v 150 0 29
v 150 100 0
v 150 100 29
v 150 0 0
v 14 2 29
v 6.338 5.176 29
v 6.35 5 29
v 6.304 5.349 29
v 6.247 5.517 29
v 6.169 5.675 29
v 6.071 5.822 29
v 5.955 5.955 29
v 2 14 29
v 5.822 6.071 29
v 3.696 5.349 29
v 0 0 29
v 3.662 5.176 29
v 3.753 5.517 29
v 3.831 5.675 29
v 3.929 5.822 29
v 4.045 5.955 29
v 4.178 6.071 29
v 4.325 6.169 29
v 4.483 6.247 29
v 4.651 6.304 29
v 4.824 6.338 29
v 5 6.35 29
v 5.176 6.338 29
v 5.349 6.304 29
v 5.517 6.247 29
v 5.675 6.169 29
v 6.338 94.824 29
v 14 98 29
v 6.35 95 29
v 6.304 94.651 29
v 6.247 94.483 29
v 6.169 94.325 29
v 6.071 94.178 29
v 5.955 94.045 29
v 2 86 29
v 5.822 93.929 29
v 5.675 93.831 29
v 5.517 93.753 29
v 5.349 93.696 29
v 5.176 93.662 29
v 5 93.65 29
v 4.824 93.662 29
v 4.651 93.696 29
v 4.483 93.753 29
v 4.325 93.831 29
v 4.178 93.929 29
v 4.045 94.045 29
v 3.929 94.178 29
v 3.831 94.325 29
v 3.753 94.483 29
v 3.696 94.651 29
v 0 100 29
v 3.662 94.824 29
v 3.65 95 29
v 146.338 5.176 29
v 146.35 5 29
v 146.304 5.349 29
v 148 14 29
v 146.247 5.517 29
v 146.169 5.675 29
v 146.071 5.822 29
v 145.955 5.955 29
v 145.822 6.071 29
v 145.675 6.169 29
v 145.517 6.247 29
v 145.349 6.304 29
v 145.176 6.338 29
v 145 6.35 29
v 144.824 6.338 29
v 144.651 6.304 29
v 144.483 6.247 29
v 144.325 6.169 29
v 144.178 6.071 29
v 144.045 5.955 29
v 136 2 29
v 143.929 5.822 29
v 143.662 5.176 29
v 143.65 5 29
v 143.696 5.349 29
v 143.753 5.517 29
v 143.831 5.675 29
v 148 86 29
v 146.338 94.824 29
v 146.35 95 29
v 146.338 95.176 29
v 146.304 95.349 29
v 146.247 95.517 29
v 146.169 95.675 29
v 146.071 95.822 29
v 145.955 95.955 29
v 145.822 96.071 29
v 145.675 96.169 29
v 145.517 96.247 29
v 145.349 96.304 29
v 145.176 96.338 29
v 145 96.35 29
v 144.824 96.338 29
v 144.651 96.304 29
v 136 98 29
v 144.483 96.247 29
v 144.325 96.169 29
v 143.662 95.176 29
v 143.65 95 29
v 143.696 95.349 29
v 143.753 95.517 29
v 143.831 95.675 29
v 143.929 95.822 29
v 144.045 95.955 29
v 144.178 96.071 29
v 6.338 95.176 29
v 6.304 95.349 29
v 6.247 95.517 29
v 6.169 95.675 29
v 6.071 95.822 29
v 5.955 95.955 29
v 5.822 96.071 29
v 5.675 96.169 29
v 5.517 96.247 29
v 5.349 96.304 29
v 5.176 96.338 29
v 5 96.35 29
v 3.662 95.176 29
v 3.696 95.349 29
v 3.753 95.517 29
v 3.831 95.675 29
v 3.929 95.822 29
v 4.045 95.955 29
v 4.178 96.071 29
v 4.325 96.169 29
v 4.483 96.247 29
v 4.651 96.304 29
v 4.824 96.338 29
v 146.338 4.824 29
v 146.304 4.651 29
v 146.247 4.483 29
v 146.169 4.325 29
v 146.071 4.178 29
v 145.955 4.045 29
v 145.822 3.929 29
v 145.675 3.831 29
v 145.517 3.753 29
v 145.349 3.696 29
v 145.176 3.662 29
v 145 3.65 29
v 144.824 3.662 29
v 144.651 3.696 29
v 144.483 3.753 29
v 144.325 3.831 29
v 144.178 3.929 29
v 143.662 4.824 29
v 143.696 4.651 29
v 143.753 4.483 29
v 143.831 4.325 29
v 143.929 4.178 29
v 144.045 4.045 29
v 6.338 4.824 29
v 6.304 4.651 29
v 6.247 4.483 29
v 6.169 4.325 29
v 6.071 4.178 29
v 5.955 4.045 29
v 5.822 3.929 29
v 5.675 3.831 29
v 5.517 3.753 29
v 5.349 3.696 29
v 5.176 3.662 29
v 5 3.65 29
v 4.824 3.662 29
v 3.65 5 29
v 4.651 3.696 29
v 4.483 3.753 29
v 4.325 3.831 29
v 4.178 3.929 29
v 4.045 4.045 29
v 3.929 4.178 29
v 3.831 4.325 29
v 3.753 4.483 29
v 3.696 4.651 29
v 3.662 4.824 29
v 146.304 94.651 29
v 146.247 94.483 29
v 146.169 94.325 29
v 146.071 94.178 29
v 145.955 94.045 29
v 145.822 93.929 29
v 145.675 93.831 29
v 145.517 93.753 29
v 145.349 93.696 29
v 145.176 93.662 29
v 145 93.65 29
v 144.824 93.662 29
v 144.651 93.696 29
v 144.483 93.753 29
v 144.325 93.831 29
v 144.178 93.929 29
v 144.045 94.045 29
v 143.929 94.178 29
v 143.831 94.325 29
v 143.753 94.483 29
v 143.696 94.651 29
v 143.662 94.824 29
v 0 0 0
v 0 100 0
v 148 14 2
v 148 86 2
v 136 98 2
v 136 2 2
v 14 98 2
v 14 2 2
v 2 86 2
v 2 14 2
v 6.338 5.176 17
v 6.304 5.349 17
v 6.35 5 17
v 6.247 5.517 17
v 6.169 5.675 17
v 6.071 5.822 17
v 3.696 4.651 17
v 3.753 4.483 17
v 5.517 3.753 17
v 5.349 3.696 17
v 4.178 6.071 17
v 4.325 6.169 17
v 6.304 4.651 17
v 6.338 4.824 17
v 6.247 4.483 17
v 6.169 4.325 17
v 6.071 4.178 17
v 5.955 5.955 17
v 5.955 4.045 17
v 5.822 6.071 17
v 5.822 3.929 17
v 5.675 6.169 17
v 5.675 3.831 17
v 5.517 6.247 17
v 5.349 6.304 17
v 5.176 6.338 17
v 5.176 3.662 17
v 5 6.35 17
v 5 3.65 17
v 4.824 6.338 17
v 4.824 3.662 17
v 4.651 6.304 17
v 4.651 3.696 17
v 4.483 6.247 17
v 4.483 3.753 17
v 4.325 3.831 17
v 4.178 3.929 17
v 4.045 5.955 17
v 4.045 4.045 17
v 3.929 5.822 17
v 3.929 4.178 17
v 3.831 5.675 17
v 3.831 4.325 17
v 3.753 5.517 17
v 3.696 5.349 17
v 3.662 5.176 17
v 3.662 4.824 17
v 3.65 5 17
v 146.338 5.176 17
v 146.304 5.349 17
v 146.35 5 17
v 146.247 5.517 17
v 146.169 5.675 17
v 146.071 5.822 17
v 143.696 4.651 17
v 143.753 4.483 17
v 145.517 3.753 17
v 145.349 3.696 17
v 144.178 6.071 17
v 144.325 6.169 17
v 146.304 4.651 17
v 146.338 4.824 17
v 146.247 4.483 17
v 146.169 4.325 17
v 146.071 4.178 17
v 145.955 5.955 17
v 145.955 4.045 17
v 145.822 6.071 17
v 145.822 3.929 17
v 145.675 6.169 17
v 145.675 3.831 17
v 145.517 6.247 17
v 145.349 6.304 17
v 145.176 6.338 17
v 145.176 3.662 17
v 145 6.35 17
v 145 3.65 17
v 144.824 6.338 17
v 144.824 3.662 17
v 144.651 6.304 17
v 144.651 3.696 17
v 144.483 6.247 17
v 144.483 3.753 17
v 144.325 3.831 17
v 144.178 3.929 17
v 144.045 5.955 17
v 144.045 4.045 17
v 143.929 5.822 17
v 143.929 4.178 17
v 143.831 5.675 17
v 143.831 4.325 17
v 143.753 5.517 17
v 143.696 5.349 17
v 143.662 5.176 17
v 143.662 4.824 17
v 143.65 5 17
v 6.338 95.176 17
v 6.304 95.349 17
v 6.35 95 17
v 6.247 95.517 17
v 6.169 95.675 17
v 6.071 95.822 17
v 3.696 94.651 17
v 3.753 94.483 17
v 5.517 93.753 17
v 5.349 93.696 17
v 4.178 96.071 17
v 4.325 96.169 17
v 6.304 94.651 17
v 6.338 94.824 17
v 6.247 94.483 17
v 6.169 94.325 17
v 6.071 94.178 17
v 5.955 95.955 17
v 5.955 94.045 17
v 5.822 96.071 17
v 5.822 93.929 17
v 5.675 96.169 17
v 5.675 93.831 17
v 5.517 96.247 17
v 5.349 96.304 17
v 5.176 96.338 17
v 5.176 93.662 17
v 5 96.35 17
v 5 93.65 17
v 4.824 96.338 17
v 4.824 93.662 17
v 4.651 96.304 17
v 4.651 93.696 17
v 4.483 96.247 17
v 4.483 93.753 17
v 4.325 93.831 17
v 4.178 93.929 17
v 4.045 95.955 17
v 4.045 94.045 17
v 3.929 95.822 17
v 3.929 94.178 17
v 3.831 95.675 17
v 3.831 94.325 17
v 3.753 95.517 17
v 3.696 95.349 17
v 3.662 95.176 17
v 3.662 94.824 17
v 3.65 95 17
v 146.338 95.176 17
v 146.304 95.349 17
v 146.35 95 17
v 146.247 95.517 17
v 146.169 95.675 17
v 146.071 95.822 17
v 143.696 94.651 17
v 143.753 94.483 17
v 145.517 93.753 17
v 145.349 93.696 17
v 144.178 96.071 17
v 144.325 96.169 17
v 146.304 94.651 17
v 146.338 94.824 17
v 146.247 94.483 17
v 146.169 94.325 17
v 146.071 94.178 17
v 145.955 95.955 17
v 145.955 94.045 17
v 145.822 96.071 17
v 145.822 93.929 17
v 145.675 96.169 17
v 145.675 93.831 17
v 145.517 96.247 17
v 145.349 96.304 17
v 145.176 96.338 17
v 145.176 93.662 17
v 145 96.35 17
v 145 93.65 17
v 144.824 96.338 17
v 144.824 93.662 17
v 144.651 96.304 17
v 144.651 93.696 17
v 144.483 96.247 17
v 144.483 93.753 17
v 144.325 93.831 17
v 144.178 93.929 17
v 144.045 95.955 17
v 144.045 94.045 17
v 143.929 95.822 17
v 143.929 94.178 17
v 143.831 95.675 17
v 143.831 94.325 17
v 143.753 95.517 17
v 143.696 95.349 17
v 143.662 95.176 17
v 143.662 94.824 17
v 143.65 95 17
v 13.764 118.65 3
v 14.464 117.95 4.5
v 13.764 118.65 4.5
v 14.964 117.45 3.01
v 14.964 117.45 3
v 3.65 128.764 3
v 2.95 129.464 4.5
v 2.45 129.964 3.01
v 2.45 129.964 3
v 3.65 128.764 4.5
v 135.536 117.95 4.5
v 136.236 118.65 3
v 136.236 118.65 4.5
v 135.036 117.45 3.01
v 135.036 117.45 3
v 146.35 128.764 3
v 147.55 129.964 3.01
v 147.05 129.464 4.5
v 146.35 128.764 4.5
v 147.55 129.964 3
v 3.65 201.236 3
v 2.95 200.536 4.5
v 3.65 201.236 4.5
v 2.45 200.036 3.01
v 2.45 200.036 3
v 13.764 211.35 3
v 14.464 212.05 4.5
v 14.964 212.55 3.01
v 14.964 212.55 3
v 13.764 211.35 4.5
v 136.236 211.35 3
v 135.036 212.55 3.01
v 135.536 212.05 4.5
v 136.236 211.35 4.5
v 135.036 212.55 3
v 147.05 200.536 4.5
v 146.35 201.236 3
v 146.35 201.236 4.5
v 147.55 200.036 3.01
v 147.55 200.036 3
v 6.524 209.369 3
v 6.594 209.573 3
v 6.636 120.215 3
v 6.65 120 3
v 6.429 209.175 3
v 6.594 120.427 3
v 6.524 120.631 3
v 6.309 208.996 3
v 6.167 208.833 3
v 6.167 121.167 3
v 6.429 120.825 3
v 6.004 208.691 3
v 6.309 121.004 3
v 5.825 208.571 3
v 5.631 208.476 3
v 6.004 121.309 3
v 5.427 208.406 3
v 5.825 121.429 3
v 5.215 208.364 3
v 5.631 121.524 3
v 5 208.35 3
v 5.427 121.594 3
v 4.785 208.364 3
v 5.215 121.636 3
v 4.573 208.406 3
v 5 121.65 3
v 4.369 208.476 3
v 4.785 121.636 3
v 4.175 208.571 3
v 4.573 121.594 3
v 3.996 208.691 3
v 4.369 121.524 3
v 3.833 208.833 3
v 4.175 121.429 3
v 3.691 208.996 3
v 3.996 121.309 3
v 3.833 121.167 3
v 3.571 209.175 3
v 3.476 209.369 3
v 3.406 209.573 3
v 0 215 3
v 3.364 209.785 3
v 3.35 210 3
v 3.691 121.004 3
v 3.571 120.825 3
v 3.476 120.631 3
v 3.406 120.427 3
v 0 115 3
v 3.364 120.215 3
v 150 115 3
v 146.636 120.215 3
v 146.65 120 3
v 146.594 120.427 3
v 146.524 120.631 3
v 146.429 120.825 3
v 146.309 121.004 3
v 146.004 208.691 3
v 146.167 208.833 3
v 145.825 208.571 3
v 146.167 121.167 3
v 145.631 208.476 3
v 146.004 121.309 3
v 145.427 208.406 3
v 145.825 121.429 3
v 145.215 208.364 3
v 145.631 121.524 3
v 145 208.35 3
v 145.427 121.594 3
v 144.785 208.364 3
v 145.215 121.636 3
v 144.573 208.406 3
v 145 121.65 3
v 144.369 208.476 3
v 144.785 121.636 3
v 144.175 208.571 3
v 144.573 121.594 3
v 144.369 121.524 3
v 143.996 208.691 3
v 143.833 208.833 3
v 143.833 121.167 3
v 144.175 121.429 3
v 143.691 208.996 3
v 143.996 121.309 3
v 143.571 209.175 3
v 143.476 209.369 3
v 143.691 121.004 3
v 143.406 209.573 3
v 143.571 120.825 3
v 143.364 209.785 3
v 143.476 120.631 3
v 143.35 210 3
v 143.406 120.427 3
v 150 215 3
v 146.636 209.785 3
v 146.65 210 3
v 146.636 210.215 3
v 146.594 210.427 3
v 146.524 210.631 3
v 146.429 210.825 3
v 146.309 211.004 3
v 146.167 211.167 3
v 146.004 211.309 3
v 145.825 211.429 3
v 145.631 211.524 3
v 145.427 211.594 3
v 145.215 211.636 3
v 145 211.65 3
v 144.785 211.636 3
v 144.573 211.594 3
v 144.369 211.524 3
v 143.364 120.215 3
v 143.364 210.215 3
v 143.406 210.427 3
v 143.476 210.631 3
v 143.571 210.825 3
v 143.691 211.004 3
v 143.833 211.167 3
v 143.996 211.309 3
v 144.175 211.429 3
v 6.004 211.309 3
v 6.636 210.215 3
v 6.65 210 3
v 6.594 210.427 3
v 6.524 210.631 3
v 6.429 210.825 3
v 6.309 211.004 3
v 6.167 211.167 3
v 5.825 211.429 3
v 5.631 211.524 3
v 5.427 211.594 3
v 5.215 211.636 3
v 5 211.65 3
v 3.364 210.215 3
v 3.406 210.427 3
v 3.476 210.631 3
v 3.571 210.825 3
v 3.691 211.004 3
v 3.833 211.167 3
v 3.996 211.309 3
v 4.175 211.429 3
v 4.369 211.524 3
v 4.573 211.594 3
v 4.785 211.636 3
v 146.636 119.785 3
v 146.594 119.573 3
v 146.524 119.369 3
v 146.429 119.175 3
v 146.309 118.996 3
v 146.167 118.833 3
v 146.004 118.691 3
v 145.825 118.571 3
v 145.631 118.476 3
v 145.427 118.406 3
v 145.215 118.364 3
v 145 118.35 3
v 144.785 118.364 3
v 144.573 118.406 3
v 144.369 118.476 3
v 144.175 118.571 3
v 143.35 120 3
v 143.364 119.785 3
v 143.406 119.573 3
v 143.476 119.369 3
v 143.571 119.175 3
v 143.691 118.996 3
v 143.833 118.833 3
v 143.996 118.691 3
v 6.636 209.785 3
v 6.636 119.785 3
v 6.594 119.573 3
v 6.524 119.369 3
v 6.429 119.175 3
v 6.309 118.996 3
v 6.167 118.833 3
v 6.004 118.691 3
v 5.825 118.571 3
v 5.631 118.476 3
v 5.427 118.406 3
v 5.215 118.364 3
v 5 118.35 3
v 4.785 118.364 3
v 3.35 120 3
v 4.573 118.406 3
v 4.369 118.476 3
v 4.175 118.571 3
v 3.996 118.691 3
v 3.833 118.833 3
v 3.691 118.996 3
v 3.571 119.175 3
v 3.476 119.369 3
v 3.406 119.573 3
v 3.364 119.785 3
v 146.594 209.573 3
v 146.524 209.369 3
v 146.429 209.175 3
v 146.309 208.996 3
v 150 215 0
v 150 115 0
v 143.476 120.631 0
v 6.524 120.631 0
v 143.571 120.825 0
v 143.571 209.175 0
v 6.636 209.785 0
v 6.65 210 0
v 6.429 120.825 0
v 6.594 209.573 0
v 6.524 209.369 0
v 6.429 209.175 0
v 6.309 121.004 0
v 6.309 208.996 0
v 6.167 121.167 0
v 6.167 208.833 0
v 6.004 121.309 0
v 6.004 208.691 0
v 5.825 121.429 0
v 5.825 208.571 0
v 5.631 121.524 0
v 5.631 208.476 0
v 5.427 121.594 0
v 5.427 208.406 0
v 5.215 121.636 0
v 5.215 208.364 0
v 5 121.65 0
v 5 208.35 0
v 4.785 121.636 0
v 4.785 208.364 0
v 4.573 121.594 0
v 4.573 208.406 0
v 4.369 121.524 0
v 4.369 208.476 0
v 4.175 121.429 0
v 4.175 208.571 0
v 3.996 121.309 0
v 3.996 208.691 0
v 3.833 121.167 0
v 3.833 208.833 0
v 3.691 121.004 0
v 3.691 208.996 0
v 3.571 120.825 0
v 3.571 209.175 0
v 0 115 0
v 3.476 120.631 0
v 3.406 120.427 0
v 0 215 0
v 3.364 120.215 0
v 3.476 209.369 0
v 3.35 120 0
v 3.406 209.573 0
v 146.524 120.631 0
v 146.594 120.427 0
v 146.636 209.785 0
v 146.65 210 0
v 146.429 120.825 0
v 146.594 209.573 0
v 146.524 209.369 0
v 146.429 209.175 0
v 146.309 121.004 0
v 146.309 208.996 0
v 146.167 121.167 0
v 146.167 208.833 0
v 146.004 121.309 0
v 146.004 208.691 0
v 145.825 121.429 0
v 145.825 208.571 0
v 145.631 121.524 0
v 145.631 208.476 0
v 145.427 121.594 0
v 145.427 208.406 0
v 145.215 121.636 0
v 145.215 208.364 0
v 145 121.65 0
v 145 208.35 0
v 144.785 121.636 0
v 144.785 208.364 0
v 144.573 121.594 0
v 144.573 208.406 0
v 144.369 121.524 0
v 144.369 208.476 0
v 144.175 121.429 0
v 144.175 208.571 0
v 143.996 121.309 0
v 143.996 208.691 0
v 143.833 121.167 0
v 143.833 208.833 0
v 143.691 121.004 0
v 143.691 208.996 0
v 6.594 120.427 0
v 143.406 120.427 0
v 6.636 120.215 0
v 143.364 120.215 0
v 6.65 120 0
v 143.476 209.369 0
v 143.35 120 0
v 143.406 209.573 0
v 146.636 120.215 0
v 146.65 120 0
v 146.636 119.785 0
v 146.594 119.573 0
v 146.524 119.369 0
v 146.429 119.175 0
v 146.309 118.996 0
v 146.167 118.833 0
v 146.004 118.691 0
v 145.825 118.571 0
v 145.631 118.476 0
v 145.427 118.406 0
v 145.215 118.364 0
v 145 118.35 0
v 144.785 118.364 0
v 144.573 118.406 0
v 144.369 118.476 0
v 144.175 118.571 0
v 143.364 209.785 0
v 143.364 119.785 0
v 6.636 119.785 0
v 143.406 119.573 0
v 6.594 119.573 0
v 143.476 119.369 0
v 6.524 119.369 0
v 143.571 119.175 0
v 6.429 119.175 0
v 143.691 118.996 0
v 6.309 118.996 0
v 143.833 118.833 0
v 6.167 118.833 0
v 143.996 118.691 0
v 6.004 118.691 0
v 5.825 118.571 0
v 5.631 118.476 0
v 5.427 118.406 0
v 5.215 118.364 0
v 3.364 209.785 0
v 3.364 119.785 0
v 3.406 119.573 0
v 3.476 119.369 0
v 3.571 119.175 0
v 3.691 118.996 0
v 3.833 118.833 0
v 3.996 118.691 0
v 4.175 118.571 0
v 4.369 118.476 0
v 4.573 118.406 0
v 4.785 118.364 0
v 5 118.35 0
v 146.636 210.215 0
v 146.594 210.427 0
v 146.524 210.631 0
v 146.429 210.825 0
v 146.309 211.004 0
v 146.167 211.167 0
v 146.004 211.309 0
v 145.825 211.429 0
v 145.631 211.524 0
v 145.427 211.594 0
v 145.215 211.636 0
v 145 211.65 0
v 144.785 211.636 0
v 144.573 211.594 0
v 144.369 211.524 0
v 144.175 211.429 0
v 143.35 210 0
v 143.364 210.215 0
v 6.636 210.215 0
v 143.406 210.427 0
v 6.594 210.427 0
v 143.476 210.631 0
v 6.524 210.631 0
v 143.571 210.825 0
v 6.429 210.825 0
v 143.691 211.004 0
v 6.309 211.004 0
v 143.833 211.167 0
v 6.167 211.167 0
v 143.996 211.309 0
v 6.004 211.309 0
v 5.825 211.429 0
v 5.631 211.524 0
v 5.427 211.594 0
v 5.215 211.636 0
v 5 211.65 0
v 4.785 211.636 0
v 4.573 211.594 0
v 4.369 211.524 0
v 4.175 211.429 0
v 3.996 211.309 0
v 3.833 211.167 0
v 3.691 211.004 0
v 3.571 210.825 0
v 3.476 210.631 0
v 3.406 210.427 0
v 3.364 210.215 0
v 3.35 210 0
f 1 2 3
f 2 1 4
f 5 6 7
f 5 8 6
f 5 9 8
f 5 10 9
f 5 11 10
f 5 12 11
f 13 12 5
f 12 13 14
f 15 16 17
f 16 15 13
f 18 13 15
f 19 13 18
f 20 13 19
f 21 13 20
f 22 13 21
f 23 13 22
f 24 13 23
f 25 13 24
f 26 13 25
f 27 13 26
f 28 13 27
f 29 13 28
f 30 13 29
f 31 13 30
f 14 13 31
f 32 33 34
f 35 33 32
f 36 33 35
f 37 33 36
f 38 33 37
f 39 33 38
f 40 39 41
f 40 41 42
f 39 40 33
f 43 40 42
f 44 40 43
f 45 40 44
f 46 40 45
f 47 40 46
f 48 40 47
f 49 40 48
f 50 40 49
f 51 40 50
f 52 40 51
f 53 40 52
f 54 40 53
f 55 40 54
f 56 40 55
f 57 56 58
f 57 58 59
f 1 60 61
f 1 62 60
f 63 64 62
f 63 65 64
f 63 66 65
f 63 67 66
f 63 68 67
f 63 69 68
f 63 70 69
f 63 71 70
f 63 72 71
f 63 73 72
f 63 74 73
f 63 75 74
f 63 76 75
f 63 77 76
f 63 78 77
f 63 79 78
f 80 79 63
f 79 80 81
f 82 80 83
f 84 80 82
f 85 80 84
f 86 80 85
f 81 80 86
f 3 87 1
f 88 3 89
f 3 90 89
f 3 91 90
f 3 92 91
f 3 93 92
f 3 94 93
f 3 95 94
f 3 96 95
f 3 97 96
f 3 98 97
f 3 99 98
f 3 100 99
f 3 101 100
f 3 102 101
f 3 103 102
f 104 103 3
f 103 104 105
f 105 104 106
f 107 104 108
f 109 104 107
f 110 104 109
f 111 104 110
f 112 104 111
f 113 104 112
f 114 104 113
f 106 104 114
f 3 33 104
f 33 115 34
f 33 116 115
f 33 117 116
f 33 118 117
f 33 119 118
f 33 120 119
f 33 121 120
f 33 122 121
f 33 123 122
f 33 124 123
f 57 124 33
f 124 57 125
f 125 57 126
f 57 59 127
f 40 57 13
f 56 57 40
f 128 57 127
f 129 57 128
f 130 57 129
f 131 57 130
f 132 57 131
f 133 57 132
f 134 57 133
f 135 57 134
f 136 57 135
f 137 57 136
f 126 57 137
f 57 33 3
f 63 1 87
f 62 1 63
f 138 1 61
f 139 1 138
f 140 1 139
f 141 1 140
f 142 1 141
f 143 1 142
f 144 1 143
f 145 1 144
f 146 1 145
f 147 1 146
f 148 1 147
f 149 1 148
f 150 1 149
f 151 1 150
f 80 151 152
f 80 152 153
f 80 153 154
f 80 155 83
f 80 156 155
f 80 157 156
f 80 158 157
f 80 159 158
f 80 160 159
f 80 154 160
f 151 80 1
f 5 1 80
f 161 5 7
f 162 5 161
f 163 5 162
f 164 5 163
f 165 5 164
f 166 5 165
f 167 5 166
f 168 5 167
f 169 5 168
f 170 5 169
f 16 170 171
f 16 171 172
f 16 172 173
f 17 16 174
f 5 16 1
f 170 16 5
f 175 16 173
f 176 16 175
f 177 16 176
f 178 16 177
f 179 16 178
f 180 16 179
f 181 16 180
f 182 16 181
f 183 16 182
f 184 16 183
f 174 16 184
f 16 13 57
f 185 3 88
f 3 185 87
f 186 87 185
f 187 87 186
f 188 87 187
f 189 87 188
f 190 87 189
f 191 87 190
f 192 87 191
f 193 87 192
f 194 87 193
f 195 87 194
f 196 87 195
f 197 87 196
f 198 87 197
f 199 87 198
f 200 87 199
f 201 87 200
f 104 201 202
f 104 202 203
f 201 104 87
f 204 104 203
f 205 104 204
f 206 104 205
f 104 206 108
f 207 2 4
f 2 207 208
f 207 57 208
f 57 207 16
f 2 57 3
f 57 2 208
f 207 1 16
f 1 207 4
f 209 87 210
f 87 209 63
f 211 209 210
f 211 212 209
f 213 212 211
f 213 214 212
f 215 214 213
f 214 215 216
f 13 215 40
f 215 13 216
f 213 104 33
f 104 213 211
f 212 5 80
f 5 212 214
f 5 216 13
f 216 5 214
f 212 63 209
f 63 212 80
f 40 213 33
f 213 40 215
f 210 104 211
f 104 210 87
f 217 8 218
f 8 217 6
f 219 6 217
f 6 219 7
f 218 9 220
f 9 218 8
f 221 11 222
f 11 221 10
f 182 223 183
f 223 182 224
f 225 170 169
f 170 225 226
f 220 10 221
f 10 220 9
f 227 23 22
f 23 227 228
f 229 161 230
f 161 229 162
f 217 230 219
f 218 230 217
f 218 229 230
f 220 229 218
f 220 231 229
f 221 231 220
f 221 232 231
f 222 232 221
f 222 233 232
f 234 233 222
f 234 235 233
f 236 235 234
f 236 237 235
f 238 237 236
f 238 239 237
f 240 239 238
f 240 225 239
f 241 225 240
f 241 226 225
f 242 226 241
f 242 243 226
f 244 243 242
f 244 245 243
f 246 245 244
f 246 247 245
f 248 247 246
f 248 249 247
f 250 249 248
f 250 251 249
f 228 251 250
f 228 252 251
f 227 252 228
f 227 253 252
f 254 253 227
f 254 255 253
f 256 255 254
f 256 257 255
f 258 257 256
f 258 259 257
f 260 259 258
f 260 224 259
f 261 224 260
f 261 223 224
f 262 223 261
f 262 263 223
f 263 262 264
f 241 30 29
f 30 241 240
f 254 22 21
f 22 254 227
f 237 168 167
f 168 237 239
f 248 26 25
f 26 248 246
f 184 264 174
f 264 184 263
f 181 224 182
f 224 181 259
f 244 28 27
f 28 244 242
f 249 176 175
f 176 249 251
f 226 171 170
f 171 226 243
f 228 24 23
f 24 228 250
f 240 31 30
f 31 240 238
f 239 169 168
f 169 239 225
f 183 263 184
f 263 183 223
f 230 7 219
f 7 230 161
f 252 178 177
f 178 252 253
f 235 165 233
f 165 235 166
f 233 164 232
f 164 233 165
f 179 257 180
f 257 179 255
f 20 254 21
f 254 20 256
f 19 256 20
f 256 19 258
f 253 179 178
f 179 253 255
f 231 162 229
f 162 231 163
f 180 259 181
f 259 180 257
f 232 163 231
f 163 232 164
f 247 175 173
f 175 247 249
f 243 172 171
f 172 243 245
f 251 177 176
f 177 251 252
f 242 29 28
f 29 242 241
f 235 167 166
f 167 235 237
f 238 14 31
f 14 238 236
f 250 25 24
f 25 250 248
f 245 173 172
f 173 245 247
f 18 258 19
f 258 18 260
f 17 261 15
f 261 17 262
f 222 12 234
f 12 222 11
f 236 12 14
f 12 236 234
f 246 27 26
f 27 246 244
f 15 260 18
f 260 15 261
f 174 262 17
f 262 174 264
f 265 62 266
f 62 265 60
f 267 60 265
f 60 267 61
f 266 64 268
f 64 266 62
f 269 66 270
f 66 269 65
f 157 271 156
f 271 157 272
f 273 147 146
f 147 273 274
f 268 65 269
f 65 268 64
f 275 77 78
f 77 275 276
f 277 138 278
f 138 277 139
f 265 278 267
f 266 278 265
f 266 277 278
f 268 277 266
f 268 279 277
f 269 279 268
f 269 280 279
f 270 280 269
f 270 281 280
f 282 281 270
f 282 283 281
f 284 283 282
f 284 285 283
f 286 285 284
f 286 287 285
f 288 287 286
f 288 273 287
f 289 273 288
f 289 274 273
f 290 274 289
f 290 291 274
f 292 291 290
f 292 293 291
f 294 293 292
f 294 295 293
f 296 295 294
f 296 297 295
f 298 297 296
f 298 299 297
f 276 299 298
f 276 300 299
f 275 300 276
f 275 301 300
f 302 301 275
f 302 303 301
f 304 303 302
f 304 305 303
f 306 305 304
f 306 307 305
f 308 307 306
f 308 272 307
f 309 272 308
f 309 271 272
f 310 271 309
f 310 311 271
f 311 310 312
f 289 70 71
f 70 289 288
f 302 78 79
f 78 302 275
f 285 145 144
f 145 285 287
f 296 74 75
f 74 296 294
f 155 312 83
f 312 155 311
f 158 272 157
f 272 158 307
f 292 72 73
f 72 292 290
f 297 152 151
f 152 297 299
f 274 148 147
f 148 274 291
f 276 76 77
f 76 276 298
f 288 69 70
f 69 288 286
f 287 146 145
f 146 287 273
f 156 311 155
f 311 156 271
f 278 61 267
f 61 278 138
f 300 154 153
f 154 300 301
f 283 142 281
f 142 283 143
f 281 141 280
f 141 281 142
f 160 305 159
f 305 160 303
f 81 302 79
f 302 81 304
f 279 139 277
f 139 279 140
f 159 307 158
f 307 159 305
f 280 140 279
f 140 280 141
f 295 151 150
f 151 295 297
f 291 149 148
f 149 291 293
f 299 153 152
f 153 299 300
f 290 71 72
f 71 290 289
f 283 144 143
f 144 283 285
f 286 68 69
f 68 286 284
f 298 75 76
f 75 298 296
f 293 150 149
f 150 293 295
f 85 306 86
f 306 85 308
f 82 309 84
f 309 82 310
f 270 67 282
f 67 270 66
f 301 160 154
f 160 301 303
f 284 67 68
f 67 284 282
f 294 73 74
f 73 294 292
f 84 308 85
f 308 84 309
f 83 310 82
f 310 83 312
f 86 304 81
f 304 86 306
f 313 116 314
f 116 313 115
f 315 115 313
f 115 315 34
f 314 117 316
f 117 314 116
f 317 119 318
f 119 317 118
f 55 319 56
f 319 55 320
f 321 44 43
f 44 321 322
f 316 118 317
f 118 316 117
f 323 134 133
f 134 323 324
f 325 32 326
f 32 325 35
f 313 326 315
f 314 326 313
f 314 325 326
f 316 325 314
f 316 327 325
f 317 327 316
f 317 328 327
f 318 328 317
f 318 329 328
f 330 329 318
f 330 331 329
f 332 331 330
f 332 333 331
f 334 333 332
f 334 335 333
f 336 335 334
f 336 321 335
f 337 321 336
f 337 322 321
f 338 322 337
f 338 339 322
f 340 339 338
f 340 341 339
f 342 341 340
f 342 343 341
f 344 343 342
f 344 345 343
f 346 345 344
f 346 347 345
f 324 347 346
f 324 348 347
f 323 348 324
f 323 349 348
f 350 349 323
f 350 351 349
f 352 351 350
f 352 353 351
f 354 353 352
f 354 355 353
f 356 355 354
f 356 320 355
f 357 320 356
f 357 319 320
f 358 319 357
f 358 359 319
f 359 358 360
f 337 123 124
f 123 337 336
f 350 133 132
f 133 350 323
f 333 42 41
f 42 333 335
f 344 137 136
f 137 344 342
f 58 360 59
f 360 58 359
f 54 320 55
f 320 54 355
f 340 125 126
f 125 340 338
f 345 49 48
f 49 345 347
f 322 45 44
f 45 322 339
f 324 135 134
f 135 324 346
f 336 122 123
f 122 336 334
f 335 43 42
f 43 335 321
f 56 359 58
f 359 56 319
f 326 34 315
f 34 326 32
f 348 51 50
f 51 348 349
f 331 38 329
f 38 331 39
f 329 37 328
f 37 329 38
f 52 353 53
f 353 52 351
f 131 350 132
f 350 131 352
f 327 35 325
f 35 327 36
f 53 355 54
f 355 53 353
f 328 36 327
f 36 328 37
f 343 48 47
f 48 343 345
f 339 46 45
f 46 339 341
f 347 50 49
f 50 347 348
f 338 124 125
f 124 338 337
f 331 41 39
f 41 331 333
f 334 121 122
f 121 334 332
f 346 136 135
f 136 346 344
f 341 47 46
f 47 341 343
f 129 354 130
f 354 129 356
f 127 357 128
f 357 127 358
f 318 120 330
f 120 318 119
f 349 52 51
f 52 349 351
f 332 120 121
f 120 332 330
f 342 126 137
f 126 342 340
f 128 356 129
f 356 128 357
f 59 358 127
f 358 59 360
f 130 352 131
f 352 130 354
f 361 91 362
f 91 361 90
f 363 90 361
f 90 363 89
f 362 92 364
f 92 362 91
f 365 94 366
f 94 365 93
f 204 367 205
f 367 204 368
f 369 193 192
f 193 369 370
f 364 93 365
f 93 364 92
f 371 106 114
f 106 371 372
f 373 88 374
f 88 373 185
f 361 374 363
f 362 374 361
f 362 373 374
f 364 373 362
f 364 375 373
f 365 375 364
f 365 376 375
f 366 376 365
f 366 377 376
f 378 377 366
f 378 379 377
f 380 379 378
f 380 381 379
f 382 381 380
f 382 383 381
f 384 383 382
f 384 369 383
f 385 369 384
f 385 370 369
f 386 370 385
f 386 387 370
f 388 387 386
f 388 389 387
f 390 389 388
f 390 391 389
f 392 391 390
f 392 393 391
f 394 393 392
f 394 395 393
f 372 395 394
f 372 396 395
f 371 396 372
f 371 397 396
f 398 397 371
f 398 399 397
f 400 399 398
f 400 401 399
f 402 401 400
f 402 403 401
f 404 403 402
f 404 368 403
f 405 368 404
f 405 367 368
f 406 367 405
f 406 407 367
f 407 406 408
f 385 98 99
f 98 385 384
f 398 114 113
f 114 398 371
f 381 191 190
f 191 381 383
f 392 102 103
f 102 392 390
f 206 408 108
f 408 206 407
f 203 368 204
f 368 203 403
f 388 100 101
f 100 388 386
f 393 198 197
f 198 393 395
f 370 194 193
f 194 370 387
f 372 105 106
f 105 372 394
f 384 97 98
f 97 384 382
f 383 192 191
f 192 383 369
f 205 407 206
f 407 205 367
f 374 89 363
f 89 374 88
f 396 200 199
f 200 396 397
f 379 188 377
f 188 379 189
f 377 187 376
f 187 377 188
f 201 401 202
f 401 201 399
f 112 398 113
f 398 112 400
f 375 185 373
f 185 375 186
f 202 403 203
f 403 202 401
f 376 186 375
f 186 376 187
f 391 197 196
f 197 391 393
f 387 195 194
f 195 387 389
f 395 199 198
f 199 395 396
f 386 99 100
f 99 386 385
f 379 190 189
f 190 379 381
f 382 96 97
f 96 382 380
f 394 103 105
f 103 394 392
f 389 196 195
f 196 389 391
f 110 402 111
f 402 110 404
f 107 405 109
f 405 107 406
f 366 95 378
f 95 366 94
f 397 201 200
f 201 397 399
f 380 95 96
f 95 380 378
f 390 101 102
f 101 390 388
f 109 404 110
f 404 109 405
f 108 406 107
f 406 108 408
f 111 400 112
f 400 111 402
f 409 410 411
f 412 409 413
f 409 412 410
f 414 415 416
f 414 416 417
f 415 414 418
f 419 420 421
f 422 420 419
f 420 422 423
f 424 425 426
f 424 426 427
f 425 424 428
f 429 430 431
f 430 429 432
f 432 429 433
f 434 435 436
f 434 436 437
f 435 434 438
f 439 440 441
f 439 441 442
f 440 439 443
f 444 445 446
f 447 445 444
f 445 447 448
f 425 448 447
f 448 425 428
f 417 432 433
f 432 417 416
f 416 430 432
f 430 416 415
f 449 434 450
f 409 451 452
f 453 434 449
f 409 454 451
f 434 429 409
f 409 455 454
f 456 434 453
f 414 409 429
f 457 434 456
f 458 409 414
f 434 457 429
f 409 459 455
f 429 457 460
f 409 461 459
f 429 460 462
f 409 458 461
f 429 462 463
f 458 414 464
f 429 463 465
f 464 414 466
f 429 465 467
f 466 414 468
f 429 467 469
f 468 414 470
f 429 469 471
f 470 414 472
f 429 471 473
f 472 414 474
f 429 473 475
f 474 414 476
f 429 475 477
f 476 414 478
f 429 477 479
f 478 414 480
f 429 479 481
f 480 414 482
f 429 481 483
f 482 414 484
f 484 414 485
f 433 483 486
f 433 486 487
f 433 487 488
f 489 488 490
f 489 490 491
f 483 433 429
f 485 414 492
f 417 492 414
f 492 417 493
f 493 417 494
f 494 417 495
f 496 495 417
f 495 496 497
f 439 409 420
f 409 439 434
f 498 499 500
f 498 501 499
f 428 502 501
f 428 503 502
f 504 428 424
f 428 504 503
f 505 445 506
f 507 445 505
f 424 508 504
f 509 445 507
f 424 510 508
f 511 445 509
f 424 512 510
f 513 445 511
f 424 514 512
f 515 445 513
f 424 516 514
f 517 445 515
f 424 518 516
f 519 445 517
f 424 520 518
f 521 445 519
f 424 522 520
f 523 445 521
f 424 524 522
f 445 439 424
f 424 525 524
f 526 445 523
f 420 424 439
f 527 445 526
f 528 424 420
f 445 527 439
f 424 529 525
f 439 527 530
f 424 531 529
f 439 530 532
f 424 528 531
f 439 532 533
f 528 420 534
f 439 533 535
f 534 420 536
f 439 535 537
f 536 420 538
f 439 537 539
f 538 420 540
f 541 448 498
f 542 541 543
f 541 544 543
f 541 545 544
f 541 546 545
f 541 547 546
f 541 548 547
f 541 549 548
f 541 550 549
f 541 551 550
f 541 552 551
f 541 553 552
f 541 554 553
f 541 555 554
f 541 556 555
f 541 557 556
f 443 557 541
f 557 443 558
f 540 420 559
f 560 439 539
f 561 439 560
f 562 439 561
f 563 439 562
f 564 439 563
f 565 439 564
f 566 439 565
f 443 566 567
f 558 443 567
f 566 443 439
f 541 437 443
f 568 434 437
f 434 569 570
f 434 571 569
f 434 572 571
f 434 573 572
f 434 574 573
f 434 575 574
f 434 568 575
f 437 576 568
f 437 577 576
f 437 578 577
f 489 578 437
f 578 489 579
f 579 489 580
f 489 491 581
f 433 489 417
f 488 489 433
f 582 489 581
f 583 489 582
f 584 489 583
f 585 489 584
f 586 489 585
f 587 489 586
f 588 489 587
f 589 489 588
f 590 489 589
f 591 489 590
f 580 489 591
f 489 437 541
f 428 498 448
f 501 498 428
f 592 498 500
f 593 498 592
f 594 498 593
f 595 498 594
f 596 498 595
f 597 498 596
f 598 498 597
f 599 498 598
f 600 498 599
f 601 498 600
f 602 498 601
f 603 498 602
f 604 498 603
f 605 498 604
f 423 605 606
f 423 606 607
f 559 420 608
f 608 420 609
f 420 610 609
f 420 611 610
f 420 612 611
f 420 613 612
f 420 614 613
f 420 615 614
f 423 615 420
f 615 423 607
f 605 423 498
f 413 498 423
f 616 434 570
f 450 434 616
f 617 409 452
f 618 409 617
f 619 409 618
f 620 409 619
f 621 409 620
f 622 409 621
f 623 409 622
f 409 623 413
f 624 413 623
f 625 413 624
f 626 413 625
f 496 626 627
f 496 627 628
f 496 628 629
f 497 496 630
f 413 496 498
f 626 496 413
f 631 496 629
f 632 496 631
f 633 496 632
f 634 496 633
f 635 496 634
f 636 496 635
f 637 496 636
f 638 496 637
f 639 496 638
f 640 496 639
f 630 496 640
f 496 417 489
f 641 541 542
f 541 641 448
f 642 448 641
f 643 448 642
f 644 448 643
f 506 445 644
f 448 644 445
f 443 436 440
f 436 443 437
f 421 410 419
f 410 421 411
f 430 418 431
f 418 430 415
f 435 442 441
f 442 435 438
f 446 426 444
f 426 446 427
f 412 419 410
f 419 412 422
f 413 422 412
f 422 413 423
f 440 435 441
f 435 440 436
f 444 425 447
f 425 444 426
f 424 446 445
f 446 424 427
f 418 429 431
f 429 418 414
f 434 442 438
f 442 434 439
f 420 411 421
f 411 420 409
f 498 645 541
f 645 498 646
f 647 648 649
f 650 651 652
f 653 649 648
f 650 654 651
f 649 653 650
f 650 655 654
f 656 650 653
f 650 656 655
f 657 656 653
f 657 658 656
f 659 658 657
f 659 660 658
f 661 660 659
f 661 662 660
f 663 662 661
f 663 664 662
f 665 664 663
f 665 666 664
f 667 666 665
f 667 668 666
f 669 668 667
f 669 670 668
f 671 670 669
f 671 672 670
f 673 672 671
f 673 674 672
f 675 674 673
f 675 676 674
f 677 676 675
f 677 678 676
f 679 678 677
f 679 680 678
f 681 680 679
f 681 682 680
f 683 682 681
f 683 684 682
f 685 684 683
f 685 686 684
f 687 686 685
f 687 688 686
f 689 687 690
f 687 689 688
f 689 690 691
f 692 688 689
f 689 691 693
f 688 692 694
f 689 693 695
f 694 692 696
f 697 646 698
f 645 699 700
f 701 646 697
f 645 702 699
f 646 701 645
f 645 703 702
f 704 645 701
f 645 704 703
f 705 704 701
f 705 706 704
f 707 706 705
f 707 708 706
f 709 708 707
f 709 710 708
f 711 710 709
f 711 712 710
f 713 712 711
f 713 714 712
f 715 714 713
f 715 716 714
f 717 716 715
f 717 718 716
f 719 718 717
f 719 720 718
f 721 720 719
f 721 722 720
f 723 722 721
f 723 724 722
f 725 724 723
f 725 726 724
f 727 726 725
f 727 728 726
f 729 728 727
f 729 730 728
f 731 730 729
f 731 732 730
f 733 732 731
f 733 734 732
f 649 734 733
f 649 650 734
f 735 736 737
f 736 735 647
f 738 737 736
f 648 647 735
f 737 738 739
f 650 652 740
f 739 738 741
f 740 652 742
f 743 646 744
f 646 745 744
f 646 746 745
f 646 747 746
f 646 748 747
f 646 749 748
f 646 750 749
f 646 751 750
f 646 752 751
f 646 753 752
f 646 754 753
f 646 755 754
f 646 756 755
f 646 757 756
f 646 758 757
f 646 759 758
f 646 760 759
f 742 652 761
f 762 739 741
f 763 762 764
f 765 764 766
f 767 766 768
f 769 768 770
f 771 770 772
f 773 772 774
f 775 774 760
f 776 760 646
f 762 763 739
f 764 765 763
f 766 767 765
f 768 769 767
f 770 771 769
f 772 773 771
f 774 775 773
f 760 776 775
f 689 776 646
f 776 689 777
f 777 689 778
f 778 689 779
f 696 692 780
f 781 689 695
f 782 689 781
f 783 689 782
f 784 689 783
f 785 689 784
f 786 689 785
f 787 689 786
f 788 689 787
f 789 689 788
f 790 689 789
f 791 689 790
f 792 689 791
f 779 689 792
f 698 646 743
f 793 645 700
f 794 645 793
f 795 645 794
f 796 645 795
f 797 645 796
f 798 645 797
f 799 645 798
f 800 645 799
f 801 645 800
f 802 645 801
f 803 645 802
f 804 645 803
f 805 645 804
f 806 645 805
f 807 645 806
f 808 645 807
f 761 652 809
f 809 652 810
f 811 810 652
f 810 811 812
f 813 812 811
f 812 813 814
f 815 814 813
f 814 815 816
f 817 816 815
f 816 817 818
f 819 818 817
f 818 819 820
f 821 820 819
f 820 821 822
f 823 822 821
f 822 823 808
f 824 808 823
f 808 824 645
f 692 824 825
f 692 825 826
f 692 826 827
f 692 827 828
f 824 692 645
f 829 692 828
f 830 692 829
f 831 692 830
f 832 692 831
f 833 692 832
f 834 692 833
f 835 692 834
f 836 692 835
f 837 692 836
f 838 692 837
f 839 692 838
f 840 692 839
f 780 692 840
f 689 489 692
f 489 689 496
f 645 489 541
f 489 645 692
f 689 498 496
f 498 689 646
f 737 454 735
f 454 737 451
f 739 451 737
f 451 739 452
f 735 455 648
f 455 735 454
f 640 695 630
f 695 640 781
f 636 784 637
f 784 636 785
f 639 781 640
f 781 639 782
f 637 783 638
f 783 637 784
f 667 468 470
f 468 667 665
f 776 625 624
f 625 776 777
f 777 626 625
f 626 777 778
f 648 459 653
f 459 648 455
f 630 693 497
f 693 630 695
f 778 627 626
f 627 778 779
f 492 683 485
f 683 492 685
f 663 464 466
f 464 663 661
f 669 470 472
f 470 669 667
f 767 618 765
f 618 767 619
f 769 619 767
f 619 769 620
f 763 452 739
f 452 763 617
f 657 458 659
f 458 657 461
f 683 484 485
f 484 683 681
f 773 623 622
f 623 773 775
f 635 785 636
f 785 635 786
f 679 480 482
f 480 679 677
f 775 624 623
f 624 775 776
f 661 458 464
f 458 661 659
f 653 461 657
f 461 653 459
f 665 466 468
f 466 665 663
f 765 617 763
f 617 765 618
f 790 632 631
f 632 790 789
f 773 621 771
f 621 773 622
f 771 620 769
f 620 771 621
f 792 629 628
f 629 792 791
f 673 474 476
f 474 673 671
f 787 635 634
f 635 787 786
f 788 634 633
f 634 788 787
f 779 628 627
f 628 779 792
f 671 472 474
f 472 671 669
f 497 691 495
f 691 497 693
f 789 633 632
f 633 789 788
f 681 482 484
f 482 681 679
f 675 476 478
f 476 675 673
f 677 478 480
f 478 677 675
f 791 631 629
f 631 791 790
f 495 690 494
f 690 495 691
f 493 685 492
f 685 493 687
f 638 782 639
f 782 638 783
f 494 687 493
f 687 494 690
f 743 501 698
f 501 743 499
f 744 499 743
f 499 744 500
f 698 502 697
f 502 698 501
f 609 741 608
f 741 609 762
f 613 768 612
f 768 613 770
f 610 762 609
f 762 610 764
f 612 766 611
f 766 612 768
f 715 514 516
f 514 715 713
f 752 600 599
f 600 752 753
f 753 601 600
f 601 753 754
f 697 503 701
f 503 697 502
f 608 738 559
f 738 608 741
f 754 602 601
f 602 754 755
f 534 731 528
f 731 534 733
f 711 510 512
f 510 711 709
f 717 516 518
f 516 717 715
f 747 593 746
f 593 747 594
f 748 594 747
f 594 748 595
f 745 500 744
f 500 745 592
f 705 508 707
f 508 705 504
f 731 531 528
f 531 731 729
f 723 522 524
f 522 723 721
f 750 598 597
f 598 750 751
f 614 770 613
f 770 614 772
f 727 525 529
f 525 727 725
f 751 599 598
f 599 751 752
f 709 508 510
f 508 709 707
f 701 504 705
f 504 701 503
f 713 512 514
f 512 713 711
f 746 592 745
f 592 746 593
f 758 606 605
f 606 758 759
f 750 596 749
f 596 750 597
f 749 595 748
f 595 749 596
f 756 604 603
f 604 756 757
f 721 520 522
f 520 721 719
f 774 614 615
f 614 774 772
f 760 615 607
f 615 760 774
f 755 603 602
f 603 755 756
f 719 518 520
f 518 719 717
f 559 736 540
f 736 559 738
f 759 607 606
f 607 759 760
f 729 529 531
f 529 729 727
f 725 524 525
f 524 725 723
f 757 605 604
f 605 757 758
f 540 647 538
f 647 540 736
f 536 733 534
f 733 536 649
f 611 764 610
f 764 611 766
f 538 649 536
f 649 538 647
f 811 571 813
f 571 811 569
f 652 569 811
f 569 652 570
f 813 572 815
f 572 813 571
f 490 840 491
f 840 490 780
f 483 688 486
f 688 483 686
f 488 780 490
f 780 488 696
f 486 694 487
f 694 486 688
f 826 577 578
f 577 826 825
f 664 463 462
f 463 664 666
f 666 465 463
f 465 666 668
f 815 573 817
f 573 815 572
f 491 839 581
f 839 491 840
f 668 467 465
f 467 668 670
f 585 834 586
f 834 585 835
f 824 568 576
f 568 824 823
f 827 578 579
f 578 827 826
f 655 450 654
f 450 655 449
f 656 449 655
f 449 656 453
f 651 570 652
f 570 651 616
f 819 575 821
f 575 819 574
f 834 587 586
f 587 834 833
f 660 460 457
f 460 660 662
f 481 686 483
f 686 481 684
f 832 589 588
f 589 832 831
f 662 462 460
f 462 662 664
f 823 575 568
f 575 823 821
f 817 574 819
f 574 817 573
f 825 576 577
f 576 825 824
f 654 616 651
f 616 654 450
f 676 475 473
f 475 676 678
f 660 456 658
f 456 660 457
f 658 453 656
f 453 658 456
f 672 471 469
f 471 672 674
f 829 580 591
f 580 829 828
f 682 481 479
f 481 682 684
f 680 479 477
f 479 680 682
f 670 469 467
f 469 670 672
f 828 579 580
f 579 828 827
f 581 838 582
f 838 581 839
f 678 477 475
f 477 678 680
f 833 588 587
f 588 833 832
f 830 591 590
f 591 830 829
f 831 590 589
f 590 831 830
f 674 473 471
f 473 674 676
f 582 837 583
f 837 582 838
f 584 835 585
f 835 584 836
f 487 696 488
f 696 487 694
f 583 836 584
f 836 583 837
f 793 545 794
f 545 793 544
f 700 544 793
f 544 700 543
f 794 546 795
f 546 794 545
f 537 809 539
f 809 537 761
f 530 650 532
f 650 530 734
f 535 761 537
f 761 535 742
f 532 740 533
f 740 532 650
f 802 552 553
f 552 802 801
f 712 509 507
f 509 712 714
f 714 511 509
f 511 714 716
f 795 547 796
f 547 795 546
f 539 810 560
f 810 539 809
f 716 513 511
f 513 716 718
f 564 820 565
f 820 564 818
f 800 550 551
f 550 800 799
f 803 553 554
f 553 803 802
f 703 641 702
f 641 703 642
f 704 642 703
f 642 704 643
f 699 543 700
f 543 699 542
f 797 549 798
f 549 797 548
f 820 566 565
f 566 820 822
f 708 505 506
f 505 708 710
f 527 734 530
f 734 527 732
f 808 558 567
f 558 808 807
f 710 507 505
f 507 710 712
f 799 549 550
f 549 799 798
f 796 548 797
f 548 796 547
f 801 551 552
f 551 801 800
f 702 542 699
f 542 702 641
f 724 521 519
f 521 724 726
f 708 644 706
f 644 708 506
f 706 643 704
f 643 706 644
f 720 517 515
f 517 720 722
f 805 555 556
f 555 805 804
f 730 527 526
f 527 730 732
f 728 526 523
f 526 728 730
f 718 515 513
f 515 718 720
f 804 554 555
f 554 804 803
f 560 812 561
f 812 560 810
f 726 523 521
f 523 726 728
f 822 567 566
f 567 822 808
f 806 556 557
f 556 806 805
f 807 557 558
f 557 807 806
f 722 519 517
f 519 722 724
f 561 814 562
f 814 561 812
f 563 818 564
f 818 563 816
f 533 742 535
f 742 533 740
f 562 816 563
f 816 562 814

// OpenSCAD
/* ============================================================================
   ESP32 Power Meter — enclosure
   Parametric box + screw-on lid for OpenSCAD.

   Render / export:
     openscad -D 'part="box"' -o box.stl enclosure.scad
     openscad -D 'part="lid"' -o lid.stl enclosure.scad
   Open the file and press F5 to see both laid out side by side.

   Both parts print flat on the bed with NO SUPPORTS. See PRINTING below for
   the one orientation rule that matters.

   ---------------------------------------------------------------------------
   WHY THIS IS 32 mm TALL AND NOT 20 mm
   ---------------------------------------------------------------------------
   20 mm was the original target, and the footprint is unchanged at 150 x 100.
   But the PZEM-004T does not fit in it. Its 5.08 mm-pitch screw terminals
   stand 10.0 mm above the PCB, so the real stack is

       5.0 mm standoff + 1.6 mm PCB + 10.0 mm terminal block = 16.6 mm

   against a 16 mm cavity — over budget before a single wire is routed, and
   some vendors list the whole module at 16-18 mm tall, which would not fit
   even sitting straight on the floor. A socketed ESP32 devkit is 13-18 mm too.

   outer_z = 32 gives a 26 mm cavity: comfortable for both boards, a slack
   loop of mains cable, and a cable gland that has real material to bite into.
   If you are using different hardware, measure it and set outer_z yourself —
   everything else derives from it.
   ========================================================================= */

// ----------------------------------------------------------------- parts ----
// "box", "lid", or "both" (both = preview layout only, do not export it)
part = "both";

// ------------------------------------------------------------ dimensions ----
outer_x   = 150;  // length, outside
outer_y   = 100;  // width, outside
outer_z   = 32;   // TOTAL height including the lid — see note above
wall      = 2;    // side wall thickness  (use 3 for a mains build)
floor_t   = 2;    // base thickness       (use 3 for a mains build)
lid_t     = 3;    // lid thickness — 3 not 2, see the lid stiffness note

// Derived. box + lid == outer_z, so the lid never adds height on top.
box_h     = outer_z - lid_t;
cav_x     = outer_x - 2 * wall;
cav_y     = outer_y - 2 * wall;
cav_z     = box_h - floor_t;      // usable internal height

// Shout if the cavity gets too shallow for the hardware this project uses.
// echo() rather than assert() so you can still build a deliberately small box.
CAV_Z_MIN = 22;
if (cav_z < CAV_Z_MIN)
  echo(str("WARNING: internal height is only ", cav_z,
           " mm. A PZEM-004T needs ~17 mm before wiring. Raise outer_z to at least ",
           CAV_Z_MIN + floor_t + lid_t, "."));

// ----------------------------------------------------------------- screws ---
// M3 thread-forming screws, 12 mm long, into printed bosses.
// PILOT SIZE MATTERS: 2.5 mm is the textbook figure for M3 but it splits
// printed PLA bosses on first assembly. 2.7 is a safe middle ground.
//   PLA 2.8   |   PETG / ABS / ASA 2.6   |   nylon 2.4
// Better still, use M3 heat-set brass inserts (4.6 mm OD): set screw_pilot_d
// to your insert's bore (typically 4.0) and boss_d to 9.
screw_pilot_d = 2.7;
screw_free_d  = 3.3;   // clearance hole through the lid
screw_depth   = 12;    // depth of the pilot hole
screw_inset   = 5;     // screw centre, in from both outer faces

// The screws do NOT land in cylindrical posts. Each corner is filled solid with
// a 45-degree gusset running gusset_l along both walls, so the screw material
// IS the corner: it reads as part of the shell rather than a cylinder stuck
// onto it, and there is no thin post-to-wall junction to crack along.
// At 16 mm the screw is fully enclosed with ~2.9 mm of material out to the
// diagonal face. Shorten it and the diagonal starts cutting into the hole.
gusset_l      = 16;

// Countersink the lid holes so the heads sit flush? Needs lid_t >= 3.5 to
// leave material behind the head, so it is off at lid_t = 3. With it off, use
// pan-head screws and let them stand proud — mechanically fine.
lid_counterbore    = false;
lid_counterbore_d  = 6.0;
lid_counterbore_h  = 1.2;

// ------------------------------------------------------------------- lid ----
// A shallow lip on the underside that drops into the opening: it locates the
// lid while you start the screws and closes the seam against dust.
lid_lip       = true;
lip_h         = 1.5;   // how far it protrudes into the box
lip_w         = 1.2;   // its wall thickness
// 0.45, not 0.3. An FDM wall bulges inward and a lip bulges outward; at 0.3 the
// two cancel and the lip binds. 0.5 if your XY compensation is uncalibrated.
lip_clear     = 0.45;
lip_taper     = 0.5;   // outer face narrows going up, so the lip self-centres

// ---------------------------------------------------------- cable entries ---
// EMPTY: the box prints fully sealed. Drill your own entries once the boards are
// positioned — with only 2 mm of wall a hand-held drill cleans a hole in
// seconds, and you get to put it exactly where the cable actually lands.
//
// To model them instead, add entries as [y_position, diameter, z_centre].
// Size them for a cable gland, not for the bare cable: 3-core 1.5 mm2 mains
// flex is 8.1 mm across and a bare printed hole is not strain relief.
//   PG7 / M12 = 12.5 mm   PG9 = 15.2   M16 = 16.2   PG11 = 18.6   M20 = 20.2
// z is explicit per hole rather than auto-centred, so a USB opening stays put
// instead of drifting whenever outer_z changes.
//   mid_z = vertical centre of the cavity
//   usb_z = centre of a micro-USB port on a board sitting on 8 mm standoffs
mid_z    = floor_t + cav_z / 2;
usb_z    = floor_t + 8 + 1.6 + 1.3;

holes_x0 = [];   // left end   e.g. [[ 30, 12.5, mid_z ]]
holes_x1 = [];   // right end  e.g. [[ 30, 12.5, mid_z ], [ 65, 12.5, mid_z ]]

// ------------------------------------------------- mains / SELV divider -----
// A full-height barrier separating the PZEM's mains terminals from the ESP32,
// LED and button. Strongly recommended for any build with mains inside — a
// 3D-printed box is not a certified enclosure, and an undivided cavity puts
// live terminals and touchable low-voltage parts in the same space.
// Off by default only because the right position depends on your layout.
divider       = false;
divider_x     = 60;   // barrier centreline; mains zone is x < divider_x
divider_t     = 3;
divider_notch_w = 8;  // pass-through for the 4 UART/5 V wires
divider_notch_h = 6;
divider_notch_y = 88; // keep it far from the mains parts

// ------------------------------------------------------- board mounting -----
// Standoffs to screw your PCBs onto, as [x, y, height, outer_d, pilot_d].
// Left EMPTY on purpose: hole spacing varies between PZEM-004T and ESP32 board
// revisions, and a standoff in the wrong place is worse than none. Measure your
// boards and fill this in.
//
// NOTE ON HEIGHT: an ESP32 devkit with its male headers still fitted has ~6 mm
// of pin protruding below the PCB, so it needs a standoff of at least 7-8 mm,
// not the 4 mm you might reach for. The PZEM's terminal pins stick out 3.7 mm.
// Example, a board with 70 x 38 mm hole spacing, corner at (12, 20):
//   standoffs = [[12,20,8,6,2.2],[82,20,8,6,2.2],[12,58,8,6,2.2],[82,58,8,6,2.2]];
standoffs = [];

// External wall-mounting tabs. Off by default because they grow the footprint
// past the 150 x 100 you asked for (to 150 x 120). Never screw through the
// bare floor instead — it breaches the enclosure and cracks the 2 mm base.
mount_ears  = false;
ear_w       = 14;
ear_d       = 10;
ear_t       = 3;
ear_hole_d  = 4.5;
ear_x       = [ 25, 125 ];

// Zip-tie slots in the floor — mounting that works whatever the hole spacing.
// They PIERCE the floor, so keep them off for any mains build.
tie_slots     = false;
tie_slot_w    = 3;
tie_slot_l    = 10;
tie_slot_gap  = 20;
tie_positions = [[ 40, 50 ], [ 110, 50 ]];

$fn = 48;

/* ==========================================================================
   Screw positions — four, one per corner.

   Worth knowing what this trades away: with corner-only fixing the lid is
   unsupported across the full 146 mm and 96 mm spans, so a 3 mm lid bows
   roughly half a millimetre at the centre of each edge and the seam can show a
   hairline gap mid-span. It stays shut and it stays flat enough to look right;
   it just is not clamped in the middle.

   If that bothers you, either raise lid_t to 4, or uncomment the mid-wall
   positions below to go back to eight screws — that halves both spans and cuts
   deflection to about an eighth. Note the commented positions would need their
   own bosses, since the corner gussets only cover the corners.
   ======================================================================== */
function screw_xy() = [
  [ screw_inset,           screw_inset           ],
  [ outer_x - screw_inset, screw_inset           ],
  [ screw_inset,           outer_y - screw_inset ],
  [ outer_x - screw_inset, outer_y - screw_inset ],
  // [ outer_x / 2,          screw_inset           ],
  // [ outer_x / 2,          outer_y - screw_inset ],
  // [ screw_inset,          outer_y / 2          ],
  // [ outer_x - screw_inset, outer_y / 2          ],
];

// The four corners, as [outer_x, outer_y, x_direction, y_direction], so one
// triangle definition serves all of them.
function gusset_corners() = [
  [ 0,       0,       1, 1 ],
  [ outer_x, 0,      -1, 1 ],
  [ 0,       outer_y, 1, -1 ],
  [ outer_x, outer_y, -1, -1 ],
];

// 2D footprint of one corner gusset: a right triangle with its square corner on
// the box corner. `grow` offsets it outward, for clearance cuts.
module gusset_2d(g, grow = 0) {
  translate([ g[0], g[1] ])
    offset(r = grow)
      polygon([ [ 0, 0 ], [ g[2] * gusset_l, 0 ], [ 0, g[3] * gusset_l ] ]);
}

/* ------------------------------------------------------------------ box --- */
module box() {
  difference() {
    union() {
      // Shell.
      difference() {
        cube([ outer_x, outer_y, box_h ]);
        translate([ wall, wall, floor_t ])
          cube([ cav_x, cav_y, cav_z + 1 ]);   // +1: the top is fully open
      }
      // Corner gussets: solid 45-degree fillets from floor to rim, continuous
      // with the walls. These replace the old free-standing cylinders.
      for (g = gusset_corners())
        translate([ 0, 0, floor_t ])
          linear_extrude(cav_z)
            gusset_2d(g);
      // Optional mains/SELV barrier, full height so the lid closes onto it.
      if (divider)
        translate([ divider_x - divider_t / 2, wall, floor_t ])
          cube([ divider_t, cav_y, cav_z ]);
      // Optional PCB standoffs.
      for (s = standoffs)
        translate([ s[0], s[1], floor_t ])
          cylinder(d = s[3], h = s[2]);
      // Optional wall-mount ears, flush with the bottom face.
      if (mount_ears)
        for (x = ear_x) {
          translate([ x - ear_w / 2, -ear_d, 0 ])       cube([ ear_w, ear_d, ear_t ]);
          translate([ x - ear_w / 2, outer_y, 0 ])      cube([ ear_w, ear_d, ear_t ]);
        }
    }

    // Pilot holes, down from the rim.
    for (p = screw_xy())
      translate([ p[0], p[1], box_h - screw_depth ])
        cylinder(d = screw_pilot_d, h = screw_depth + 0.1);

    // Standoff pilot holes.
    for (s = standoffs)
      translate([ s[0], s[1], floor_t + s[2] - 8 ])
        cylinder(d = s[4], h = 8 + 0.1);

    // Cable entries.
    for (h = holes_x0)
      translate([ -0.1, h[0], h[2] ]) rotate([ 0, 90, 0 ])
        cylinder(d = h[1], h = wall + 0.2);
    for (h = holes_x1)
      translate([ outer_x - wall - 0.1, h[0], h[2] ]) rotate([ 0, 90, 0 ])
        cylinder(d = h[1], h = wall + 0.2);

    // Wire pass-through in the barrier.
    if (divider)
      translate([ divider_x - divider_t / 2 - 0.1,
                  divider_notch_y - divider_notch_w / 2,
                  box_h - divider_notch_h ])
        cube([ divider_t + 0.2, divider_notch_w, divider_notch_h + 0.1 ]);

    // Ear through-holes.
    if (mount_ears)
      for (x = ear_x) {
        translate([ x, -ear_d / 2, -0.1 ])          cylinder(d = ear_hole_d, h = ear_t + 0.2);
        translate([ x, outer_y + ear_d / 2, -0.1 ]) cylinder(d = ear_hole_d, h = ear_t + 0.2);
      }

    // Zip-tie slots.
    if (tie_slots)
      for (t = tie_positions)
        for (dx = [ -tie_slot_gap / 2, tie_slot_gap / 2 ])
          translate([ t[0] + dx - tie_slot_w / 2, t[1] - tie_slot_l / 2, -0.1 ])
            cube([ tie_slot_w, tie_slot_l, floor_t + 0.2 ]);
  }
}

/* ------------------------------------------------------------------ lid ---
   PRINTING: modelled in print orientation — flat outer face on the bed, lip
   pointing UP. Print it exactly like this. Do NOT flip it lip-down: that puts
   the whole 150 x 100 plate in mid-air over the lip and needs full supports.
   If you want a nicer outer face, use a textured build plate, not a flip.
   ------------------------------------------------------------------------ */
module lid() {
  difference() {
    union() {
      cube([ outer_x, outer_y, lid_t ]);
      if (lid_lip)
        translate([ 0, 0, lid_t ]) lip();
    }

    for (p = screw_xy()) {
      translate([ p[0], p[1], -0.1 ])
        cylinder(d = screw_free_d, h = lid_t + lip_h + 0.2);
      if (lid_counterbore)
        translate([ p[0], p[1], -0.1 ])
          cylinder(d = lid_counterbore_d, h = lid_counterbore_h + 0.1);
    }
  }
}

// The locating lip: a thin frame that drops into the cavity, tapered inward as
// it rises so it self-centres, with the screw bosses cut away so it clears them.
module lip() {
  ox = wall + lip_clear;                 // outer offset from the box outside
  lx = cav_x - 2 * lip_clear;            // lip outer footprint
  ly = cav_y - 2 * lip_clear;
  difference() {
    // Tapered outer body. The taper narrows going UP, so printed lip-up it
    // introduces no overhang and costs nothing.
    hull() {
      translate([ ox, oy_(), 0 ]) cube([ lx, ly, 0.01 ]);
      translate([ ox + lip_taper, oy_() + lip_taper, lip_h - 0.01 ])
        cube([ lx - 2 * lip_taper, ly - 2 * lip_taper, 0.01 ]);
    }
    // Hollow it out.
    translate([ ox + lip_w, oy_() + lip_w, -0.1 ])
      cube([ lx - 2 * lip_w, ly - 2 * lip_w, lip_h + 0.2 ]);
    // Clear the corner gussets, grown 1 mm so the lip never touches them. A
    // tighter cut left sub-0.03 mm degenerate slivers in the lip corners, which
    // are the kind of geometry that makes a slicer fall over.
    for (g = gusset_corners())
      translate([ 0, 0, -0.1 ])
        linear_extrude(lip_h + 0.2)
          gusset_2d(g, 1);
  }
}
function oy_() = wall + lip_clear;

/* ----------------------------------------------------------------- output -- */
if (part == "box")      box();
else if (part == "lid") lid();
else {
  box();
  translate([ 0, outer_y + 15, 0 ]) lid();
}
